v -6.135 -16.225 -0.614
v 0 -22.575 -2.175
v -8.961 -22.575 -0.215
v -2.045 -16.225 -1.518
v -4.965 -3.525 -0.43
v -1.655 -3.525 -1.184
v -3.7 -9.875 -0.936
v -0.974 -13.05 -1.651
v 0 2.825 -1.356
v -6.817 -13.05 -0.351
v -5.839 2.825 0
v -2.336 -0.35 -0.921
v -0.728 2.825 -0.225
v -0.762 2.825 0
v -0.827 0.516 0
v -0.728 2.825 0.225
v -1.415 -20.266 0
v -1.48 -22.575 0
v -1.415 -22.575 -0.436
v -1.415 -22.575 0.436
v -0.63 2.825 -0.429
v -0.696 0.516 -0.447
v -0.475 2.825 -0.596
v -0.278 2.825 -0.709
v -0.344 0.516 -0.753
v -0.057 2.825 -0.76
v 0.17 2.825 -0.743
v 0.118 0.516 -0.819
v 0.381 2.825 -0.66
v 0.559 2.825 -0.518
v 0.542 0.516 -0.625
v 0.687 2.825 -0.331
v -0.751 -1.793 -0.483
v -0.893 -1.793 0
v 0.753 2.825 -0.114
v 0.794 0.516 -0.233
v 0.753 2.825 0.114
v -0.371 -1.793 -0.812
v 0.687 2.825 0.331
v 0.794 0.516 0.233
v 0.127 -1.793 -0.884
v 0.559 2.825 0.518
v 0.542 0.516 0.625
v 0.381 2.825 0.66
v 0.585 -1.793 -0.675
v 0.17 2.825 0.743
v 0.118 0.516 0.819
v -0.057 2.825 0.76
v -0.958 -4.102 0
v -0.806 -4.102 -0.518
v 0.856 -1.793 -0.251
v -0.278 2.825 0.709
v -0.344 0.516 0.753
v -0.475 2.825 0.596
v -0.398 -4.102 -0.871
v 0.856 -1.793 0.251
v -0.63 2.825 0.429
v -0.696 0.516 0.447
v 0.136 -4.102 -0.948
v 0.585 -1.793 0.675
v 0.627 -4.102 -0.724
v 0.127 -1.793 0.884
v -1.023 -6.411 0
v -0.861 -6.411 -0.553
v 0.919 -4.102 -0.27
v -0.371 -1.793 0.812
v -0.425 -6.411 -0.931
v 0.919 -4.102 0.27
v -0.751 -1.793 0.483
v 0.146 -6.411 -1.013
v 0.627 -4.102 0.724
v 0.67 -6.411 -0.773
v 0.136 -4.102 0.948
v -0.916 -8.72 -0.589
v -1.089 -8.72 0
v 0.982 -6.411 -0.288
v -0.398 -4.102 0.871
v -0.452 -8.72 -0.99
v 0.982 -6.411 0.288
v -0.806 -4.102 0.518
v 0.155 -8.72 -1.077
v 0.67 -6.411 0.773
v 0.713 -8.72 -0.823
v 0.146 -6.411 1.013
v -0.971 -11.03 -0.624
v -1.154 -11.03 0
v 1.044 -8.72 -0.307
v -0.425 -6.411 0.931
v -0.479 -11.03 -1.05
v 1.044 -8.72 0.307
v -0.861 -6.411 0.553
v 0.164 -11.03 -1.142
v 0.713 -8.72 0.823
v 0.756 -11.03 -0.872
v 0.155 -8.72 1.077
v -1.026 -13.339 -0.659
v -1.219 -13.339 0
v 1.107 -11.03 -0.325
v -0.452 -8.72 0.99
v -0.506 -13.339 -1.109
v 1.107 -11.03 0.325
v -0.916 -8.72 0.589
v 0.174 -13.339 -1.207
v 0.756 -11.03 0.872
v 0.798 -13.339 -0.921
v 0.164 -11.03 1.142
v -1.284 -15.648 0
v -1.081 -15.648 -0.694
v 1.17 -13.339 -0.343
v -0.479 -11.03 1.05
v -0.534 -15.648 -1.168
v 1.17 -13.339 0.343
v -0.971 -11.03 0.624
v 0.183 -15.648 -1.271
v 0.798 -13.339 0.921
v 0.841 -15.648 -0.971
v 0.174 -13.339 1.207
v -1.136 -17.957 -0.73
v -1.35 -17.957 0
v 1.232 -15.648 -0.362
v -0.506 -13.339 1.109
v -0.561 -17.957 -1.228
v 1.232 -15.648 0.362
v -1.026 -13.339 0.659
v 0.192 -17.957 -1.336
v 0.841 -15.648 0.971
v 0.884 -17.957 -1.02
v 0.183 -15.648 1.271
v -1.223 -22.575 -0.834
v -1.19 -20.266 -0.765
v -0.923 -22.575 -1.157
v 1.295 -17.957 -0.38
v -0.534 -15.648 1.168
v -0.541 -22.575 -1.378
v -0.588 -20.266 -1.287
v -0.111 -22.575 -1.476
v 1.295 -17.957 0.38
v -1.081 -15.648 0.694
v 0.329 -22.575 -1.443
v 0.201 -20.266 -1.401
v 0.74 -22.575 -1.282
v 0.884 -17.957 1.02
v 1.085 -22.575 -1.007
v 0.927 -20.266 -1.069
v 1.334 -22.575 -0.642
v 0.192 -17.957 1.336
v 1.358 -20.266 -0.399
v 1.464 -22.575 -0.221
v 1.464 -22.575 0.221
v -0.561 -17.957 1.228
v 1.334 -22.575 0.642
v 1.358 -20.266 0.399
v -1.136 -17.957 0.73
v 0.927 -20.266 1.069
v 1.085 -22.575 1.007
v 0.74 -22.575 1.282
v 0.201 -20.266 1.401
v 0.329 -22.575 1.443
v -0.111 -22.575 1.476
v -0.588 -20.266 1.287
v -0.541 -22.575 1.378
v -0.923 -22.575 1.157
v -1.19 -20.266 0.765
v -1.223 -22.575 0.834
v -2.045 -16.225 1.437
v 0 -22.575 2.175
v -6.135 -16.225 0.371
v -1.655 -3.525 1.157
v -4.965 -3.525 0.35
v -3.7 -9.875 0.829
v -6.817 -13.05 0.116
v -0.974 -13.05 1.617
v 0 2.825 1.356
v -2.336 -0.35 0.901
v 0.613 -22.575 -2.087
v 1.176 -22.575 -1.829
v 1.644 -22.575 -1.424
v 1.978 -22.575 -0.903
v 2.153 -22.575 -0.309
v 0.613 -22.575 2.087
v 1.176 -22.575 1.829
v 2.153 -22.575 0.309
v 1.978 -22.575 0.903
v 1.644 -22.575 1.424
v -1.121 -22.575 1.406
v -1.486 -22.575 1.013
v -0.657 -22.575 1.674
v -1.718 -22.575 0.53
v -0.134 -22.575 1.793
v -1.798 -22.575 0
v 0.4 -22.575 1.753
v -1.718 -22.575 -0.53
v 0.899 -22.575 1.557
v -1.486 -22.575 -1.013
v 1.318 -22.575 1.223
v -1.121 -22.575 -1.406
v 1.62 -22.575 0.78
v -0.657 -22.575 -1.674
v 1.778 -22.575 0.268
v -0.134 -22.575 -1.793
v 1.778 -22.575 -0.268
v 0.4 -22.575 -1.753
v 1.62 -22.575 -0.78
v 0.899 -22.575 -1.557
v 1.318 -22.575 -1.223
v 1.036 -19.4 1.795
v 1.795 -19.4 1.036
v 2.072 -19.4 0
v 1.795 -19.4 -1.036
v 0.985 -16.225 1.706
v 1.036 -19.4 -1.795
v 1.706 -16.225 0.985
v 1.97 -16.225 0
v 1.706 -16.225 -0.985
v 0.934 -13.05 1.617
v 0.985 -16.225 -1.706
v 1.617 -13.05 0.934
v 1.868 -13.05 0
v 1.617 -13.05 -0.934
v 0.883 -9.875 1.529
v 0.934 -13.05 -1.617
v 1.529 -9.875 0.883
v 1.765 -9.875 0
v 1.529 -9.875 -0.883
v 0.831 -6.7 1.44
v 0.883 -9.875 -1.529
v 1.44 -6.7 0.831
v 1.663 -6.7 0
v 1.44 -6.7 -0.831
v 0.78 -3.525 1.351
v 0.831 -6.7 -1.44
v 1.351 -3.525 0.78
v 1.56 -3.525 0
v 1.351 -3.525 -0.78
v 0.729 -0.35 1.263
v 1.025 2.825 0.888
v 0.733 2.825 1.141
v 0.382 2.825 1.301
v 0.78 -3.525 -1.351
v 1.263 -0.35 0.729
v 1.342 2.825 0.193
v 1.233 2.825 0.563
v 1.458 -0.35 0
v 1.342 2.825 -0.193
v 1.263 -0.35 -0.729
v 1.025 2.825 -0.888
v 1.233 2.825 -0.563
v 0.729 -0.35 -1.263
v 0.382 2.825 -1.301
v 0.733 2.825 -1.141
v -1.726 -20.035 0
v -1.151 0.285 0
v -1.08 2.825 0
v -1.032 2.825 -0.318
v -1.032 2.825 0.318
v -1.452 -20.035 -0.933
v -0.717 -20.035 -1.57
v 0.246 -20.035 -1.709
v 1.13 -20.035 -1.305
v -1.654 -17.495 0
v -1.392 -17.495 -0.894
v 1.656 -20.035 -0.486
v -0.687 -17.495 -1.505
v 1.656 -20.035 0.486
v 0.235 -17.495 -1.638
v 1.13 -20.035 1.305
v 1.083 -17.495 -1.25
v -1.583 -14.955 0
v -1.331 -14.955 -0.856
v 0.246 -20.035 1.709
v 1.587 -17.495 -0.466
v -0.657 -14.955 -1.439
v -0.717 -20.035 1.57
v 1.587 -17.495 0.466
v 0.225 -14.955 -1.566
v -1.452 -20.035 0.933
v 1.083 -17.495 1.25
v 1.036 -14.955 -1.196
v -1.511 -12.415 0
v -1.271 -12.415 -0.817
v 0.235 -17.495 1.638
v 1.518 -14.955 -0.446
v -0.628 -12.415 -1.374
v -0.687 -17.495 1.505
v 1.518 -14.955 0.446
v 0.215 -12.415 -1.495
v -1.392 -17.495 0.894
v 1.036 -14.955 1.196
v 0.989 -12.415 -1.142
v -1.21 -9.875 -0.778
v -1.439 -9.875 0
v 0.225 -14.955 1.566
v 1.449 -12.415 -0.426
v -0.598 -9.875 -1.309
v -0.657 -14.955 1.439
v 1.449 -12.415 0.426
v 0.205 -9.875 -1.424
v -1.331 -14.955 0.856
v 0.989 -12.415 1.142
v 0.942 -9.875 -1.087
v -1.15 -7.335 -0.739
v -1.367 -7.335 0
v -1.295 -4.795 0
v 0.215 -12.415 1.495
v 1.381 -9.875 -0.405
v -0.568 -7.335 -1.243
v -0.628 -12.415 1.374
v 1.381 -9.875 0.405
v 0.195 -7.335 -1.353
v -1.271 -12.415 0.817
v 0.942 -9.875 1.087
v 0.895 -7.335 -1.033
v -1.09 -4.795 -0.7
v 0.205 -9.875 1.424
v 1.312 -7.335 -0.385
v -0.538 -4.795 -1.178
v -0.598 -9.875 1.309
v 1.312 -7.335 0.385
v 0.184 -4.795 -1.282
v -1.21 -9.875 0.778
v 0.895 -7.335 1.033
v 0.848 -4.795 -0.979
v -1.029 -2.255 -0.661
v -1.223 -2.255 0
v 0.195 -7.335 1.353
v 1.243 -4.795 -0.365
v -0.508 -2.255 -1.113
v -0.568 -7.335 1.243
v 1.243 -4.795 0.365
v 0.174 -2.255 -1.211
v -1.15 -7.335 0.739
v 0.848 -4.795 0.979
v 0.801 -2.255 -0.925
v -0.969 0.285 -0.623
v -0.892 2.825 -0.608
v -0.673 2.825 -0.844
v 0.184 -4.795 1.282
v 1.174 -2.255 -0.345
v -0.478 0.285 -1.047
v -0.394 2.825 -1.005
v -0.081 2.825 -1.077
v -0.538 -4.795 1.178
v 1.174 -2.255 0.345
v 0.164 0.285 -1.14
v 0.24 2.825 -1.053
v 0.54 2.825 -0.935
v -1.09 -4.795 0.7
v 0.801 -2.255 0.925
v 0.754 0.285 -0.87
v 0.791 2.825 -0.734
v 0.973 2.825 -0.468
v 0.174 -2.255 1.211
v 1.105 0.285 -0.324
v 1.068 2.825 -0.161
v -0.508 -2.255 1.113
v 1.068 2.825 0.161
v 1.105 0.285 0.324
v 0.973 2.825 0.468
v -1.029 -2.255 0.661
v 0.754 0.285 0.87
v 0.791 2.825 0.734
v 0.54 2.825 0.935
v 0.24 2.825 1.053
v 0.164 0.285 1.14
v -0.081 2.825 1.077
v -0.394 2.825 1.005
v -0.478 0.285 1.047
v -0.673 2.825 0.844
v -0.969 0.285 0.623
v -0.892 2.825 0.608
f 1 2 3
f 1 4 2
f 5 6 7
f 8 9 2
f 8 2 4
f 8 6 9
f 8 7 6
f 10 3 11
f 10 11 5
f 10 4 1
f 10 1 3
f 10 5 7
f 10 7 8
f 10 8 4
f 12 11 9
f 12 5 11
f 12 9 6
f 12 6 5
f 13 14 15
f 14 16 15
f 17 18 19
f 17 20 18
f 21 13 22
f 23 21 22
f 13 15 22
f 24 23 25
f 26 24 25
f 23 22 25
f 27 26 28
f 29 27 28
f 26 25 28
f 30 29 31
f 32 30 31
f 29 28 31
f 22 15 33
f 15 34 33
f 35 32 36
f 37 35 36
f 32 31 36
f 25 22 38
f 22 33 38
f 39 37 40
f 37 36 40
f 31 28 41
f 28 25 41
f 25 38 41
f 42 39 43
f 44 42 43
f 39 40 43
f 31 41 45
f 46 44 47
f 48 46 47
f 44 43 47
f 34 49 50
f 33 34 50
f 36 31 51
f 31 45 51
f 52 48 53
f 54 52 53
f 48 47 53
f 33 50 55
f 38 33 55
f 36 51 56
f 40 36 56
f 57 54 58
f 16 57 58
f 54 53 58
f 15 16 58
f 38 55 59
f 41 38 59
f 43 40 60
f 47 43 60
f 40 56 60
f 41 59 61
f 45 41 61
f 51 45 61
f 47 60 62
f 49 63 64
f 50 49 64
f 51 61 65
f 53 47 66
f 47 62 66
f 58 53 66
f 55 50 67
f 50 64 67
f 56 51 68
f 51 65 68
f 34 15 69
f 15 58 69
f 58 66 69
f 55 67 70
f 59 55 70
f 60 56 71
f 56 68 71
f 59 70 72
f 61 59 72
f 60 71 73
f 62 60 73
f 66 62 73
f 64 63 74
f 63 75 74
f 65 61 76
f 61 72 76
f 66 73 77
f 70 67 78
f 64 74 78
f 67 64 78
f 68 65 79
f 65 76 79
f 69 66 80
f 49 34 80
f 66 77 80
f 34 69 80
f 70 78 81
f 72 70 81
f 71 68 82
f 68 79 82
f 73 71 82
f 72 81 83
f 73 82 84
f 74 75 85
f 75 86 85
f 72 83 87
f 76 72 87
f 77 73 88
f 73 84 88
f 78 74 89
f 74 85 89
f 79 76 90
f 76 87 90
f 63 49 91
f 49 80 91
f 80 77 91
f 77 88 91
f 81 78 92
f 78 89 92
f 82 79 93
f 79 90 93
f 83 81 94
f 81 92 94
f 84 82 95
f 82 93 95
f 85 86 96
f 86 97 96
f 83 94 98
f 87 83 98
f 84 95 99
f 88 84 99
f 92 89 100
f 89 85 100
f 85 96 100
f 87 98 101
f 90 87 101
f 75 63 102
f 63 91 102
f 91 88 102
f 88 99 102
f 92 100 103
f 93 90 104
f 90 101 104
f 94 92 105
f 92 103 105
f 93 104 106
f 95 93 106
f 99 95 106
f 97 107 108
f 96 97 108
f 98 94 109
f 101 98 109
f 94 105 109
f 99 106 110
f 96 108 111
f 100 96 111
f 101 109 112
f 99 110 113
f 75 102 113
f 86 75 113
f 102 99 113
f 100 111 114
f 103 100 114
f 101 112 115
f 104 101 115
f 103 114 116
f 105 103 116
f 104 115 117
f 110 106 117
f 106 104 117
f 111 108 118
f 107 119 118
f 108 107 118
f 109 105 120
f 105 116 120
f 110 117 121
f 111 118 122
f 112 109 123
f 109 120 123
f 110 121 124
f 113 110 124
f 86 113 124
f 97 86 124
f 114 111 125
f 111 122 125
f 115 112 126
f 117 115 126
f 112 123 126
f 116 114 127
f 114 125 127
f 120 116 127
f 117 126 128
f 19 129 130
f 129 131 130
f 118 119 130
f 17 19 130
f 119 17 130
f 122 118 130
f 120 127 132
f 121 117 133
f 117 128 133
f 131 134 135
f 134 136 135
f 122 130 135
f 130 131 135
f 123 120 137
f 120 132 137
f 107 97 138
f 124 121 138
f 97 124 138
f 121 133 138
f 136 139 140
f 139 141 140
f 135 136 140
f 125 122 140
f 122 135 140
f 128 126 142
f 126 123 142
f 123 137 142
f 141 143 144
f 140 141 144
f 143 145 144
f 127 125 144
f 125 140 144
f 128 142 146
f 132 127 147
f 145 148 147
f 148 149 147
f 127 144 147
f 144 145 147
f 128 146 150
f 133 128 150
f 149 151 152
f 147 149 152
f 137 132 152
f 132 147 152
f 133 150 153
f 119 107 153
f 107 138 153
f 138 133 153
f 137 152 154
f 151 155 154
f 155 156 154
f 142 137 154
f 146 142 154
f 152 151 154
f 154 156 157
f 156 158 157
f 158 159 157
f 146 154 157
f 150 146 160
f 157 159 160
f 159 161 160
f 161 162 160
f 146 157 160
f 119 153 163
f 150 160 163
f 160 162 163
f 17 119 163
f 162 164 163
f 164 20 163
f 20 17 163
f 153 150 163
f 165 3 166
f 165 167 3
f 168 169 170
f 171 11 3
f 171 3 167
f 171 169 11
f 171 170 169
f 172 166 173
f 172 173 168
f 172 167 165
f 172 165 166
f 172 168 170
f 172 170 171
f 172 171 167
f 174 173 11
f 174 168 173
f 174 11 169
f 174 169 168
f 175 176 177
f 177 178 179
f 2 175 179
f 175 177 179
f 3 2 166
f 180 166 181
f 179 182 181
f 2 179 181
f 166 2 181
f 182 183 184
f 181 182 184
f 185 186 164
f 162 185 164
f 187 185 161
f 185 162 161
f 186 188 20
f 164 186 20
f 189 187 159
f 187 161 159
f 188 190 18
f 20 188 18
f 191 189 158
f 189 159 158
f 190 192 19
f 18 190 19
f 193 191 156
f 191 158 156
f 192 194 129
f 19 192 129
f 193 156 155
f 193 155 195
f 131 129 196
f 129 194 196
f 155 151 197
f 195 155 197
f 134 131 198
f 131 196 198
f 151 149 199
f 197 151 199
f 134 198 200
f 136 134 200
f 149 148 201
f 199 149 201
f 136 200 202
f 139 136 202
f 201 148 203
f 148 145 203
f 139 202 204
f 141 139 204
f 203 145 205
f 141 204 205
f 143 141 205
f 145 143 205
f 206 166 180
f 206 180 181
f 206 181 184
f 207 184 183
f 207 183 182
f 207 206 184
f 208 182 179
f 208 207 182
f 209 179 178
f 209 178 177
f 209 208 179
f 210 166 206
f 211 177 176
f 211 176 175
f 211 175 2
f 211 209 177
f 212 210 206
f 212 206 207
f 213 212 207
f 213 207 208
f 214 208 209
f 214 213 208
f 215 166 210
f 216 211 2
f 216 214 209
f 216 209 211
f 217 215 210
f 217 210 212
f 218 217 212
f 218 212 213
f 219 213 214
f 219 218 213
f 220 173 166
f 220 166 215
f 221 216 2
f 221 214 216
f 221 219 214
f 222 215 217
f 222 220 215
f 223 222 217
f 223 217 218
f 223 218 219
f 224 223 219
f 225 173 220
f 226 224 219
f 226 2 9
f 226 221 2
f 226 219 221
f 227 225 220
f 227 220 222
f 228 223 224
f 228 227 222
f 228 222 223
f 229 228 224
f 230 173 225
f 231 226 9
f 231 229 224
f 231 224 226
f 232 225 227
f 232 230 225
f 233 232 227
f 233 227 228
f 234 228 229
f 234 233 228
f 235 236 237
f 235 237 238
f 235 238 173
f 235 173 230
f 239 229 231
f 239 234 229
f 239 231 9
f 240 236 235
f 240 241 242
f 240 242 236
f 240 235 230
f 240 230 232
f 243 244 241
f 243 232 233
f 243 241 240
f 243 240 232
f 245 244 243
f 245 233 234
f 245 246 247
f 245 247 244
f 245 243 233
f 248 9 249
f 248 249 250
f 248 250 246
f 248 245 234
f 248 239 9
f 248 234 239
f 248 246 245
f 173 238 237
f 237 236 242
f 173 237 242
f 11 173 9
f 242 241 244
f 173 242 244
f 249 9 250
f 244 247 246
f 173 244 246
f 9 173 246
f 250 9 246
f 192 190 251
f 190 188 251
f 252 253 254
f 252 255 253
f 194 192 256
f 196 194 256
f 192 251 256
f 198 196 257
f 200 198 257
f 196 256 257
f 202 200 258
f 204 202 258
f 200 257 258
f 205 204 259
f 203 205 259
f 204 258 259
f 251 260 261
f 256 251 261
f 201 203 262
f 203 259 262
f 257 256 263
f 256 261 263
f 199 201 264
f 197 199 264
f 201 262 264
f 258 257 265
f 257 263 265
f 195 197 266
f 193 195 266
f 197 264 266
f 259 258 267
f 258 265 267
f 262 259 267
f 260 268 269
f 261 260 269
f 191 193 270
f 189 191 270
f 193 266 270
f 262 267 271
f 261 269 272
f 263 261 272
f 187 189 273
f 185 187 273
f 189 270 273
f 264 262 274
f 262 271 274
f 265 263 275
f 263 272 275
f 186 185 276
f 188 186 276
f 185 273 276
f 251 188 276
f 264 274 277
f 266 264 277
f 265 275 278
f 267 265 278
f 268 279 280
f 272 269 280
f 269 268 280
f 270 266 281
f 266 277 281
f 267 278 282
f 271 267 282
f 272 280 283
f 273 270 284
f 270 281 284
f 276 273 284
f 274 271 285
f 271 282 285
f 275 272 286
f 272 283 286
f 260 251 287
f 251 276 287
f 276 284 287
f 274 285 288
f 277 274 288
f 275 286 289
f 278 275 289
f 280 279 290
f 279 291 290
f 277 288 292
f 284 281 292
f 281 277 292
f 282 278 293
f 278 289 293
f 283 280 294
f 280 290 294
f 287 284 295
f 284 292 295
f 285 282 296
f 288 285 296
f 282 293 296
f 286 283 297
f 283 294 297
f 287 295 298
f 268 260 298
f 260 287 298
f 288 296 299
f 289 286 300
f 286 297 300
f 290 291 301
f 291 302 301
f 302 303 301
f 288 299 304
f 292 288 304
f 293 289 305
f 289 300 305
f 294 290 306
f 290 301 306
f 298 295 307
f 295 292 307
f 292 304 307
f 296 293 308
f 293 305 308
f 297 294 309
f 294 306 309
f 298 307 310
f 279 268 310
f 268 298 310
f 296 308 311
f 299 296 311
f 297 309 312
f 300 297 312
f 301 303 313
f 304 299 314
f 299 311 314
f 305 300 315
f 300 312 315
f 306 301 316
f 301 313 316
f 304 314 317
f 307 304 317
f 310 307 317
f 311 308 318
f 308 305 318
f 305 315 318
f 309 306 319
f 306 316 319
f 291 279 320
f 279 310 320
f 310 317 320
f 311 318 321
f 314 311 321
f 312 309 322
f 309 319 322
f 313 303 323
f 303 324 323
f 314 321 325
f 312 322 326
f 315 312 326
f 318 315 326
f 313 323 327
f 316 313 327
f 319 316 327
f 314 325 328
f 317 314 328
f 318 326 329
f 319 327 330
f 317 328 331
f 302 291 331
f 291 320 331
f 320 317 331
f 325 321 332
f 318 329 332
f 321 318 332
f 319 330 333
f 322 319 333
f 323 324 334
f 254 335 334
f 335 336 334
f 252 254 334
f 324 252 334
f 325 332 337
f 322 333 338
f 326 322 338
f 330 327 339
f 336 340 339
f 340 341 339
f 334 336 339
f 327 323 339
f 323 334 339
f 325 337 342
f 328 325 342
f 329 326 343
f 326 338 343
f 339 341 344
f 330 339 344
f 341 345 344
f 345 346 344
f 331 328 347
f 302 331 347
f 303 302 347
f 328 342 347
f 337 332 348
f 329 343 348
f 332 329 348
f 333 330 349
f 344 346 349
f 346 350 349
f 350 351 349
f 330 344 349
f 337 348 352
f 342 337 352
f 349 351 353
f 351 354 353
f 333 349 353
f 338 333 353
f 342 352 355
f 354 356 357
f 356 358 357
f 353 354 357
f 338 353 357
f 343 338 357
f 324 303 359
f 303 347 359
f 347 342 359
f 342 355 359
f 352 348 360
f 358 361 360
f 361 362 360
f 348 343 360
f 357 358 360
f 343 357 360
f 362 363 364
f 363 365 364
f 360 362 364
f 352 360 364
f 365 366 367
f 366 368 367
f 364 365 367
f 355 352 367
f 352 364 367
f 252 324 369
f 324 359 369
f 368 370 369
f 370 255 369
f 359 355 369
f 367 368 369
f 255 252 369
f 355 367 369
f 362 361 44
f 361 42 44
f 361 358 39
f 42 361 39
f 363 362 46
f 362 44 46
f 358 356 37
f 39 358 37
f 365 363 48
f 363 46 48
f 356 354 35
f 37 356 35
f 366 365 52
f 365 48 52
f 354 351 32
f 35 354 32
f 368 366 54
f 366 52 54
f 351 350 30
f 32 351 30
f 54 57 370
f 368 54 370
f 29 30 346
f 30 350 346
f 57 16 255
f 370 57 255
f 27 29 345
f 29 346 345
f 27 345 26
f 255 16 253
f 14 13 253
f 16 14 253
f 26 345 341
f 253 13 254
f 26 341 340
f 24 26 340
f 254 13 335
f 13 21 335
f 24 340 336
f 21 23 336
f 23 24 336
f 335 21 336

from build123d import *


with BuildPart() as part:
    # Sketch1 → Revolve1 (revolve)
    with BuildSketch(Plane.XY):
        Polygon((-0.762, 2.82502419), (-1.480393248, -22.57497581), (-1.798020213, -22.57497581), (-1.079626965, 2.82502419), align=None)
    revolve(axis=Axis((0, 2.931830397, 0), (0, -1, 0)))


with BuildPart() as body_2:
    # Sketch2 → Loft1 section 0
    with BuildSketch(Plane.XZ.offset(22.57497581)):
        with BuildLine():
            Line((-8.961086966, -0.215231881), (0, 2.174669252))
            ThreePointArc((0, 2.174669252), (2.174669252, 0), (0, -2.174669252))
            Line((0, -2.174669252), (-8.961086966, -0.215231881))
        make_face()
    # Sketch3 → Loft1 section 1
    with BuildSketch(Plane(origin=(0, 2.82502419, 0), x_dir=(1, 0, 0), z_dir=(0, 1, 0))):
        with BuildLine():
            Line((-5.838970763, 0), (0, 1.355751728))
            ThreePointArc((0, 1.355751728), (1.355751728, 0), (0, -1.355751728))
            Line((0, -1.355751728), (-5.838970763, 0))
        make_face()
    loft()


solid = Compound([part.part, body_2.part])
